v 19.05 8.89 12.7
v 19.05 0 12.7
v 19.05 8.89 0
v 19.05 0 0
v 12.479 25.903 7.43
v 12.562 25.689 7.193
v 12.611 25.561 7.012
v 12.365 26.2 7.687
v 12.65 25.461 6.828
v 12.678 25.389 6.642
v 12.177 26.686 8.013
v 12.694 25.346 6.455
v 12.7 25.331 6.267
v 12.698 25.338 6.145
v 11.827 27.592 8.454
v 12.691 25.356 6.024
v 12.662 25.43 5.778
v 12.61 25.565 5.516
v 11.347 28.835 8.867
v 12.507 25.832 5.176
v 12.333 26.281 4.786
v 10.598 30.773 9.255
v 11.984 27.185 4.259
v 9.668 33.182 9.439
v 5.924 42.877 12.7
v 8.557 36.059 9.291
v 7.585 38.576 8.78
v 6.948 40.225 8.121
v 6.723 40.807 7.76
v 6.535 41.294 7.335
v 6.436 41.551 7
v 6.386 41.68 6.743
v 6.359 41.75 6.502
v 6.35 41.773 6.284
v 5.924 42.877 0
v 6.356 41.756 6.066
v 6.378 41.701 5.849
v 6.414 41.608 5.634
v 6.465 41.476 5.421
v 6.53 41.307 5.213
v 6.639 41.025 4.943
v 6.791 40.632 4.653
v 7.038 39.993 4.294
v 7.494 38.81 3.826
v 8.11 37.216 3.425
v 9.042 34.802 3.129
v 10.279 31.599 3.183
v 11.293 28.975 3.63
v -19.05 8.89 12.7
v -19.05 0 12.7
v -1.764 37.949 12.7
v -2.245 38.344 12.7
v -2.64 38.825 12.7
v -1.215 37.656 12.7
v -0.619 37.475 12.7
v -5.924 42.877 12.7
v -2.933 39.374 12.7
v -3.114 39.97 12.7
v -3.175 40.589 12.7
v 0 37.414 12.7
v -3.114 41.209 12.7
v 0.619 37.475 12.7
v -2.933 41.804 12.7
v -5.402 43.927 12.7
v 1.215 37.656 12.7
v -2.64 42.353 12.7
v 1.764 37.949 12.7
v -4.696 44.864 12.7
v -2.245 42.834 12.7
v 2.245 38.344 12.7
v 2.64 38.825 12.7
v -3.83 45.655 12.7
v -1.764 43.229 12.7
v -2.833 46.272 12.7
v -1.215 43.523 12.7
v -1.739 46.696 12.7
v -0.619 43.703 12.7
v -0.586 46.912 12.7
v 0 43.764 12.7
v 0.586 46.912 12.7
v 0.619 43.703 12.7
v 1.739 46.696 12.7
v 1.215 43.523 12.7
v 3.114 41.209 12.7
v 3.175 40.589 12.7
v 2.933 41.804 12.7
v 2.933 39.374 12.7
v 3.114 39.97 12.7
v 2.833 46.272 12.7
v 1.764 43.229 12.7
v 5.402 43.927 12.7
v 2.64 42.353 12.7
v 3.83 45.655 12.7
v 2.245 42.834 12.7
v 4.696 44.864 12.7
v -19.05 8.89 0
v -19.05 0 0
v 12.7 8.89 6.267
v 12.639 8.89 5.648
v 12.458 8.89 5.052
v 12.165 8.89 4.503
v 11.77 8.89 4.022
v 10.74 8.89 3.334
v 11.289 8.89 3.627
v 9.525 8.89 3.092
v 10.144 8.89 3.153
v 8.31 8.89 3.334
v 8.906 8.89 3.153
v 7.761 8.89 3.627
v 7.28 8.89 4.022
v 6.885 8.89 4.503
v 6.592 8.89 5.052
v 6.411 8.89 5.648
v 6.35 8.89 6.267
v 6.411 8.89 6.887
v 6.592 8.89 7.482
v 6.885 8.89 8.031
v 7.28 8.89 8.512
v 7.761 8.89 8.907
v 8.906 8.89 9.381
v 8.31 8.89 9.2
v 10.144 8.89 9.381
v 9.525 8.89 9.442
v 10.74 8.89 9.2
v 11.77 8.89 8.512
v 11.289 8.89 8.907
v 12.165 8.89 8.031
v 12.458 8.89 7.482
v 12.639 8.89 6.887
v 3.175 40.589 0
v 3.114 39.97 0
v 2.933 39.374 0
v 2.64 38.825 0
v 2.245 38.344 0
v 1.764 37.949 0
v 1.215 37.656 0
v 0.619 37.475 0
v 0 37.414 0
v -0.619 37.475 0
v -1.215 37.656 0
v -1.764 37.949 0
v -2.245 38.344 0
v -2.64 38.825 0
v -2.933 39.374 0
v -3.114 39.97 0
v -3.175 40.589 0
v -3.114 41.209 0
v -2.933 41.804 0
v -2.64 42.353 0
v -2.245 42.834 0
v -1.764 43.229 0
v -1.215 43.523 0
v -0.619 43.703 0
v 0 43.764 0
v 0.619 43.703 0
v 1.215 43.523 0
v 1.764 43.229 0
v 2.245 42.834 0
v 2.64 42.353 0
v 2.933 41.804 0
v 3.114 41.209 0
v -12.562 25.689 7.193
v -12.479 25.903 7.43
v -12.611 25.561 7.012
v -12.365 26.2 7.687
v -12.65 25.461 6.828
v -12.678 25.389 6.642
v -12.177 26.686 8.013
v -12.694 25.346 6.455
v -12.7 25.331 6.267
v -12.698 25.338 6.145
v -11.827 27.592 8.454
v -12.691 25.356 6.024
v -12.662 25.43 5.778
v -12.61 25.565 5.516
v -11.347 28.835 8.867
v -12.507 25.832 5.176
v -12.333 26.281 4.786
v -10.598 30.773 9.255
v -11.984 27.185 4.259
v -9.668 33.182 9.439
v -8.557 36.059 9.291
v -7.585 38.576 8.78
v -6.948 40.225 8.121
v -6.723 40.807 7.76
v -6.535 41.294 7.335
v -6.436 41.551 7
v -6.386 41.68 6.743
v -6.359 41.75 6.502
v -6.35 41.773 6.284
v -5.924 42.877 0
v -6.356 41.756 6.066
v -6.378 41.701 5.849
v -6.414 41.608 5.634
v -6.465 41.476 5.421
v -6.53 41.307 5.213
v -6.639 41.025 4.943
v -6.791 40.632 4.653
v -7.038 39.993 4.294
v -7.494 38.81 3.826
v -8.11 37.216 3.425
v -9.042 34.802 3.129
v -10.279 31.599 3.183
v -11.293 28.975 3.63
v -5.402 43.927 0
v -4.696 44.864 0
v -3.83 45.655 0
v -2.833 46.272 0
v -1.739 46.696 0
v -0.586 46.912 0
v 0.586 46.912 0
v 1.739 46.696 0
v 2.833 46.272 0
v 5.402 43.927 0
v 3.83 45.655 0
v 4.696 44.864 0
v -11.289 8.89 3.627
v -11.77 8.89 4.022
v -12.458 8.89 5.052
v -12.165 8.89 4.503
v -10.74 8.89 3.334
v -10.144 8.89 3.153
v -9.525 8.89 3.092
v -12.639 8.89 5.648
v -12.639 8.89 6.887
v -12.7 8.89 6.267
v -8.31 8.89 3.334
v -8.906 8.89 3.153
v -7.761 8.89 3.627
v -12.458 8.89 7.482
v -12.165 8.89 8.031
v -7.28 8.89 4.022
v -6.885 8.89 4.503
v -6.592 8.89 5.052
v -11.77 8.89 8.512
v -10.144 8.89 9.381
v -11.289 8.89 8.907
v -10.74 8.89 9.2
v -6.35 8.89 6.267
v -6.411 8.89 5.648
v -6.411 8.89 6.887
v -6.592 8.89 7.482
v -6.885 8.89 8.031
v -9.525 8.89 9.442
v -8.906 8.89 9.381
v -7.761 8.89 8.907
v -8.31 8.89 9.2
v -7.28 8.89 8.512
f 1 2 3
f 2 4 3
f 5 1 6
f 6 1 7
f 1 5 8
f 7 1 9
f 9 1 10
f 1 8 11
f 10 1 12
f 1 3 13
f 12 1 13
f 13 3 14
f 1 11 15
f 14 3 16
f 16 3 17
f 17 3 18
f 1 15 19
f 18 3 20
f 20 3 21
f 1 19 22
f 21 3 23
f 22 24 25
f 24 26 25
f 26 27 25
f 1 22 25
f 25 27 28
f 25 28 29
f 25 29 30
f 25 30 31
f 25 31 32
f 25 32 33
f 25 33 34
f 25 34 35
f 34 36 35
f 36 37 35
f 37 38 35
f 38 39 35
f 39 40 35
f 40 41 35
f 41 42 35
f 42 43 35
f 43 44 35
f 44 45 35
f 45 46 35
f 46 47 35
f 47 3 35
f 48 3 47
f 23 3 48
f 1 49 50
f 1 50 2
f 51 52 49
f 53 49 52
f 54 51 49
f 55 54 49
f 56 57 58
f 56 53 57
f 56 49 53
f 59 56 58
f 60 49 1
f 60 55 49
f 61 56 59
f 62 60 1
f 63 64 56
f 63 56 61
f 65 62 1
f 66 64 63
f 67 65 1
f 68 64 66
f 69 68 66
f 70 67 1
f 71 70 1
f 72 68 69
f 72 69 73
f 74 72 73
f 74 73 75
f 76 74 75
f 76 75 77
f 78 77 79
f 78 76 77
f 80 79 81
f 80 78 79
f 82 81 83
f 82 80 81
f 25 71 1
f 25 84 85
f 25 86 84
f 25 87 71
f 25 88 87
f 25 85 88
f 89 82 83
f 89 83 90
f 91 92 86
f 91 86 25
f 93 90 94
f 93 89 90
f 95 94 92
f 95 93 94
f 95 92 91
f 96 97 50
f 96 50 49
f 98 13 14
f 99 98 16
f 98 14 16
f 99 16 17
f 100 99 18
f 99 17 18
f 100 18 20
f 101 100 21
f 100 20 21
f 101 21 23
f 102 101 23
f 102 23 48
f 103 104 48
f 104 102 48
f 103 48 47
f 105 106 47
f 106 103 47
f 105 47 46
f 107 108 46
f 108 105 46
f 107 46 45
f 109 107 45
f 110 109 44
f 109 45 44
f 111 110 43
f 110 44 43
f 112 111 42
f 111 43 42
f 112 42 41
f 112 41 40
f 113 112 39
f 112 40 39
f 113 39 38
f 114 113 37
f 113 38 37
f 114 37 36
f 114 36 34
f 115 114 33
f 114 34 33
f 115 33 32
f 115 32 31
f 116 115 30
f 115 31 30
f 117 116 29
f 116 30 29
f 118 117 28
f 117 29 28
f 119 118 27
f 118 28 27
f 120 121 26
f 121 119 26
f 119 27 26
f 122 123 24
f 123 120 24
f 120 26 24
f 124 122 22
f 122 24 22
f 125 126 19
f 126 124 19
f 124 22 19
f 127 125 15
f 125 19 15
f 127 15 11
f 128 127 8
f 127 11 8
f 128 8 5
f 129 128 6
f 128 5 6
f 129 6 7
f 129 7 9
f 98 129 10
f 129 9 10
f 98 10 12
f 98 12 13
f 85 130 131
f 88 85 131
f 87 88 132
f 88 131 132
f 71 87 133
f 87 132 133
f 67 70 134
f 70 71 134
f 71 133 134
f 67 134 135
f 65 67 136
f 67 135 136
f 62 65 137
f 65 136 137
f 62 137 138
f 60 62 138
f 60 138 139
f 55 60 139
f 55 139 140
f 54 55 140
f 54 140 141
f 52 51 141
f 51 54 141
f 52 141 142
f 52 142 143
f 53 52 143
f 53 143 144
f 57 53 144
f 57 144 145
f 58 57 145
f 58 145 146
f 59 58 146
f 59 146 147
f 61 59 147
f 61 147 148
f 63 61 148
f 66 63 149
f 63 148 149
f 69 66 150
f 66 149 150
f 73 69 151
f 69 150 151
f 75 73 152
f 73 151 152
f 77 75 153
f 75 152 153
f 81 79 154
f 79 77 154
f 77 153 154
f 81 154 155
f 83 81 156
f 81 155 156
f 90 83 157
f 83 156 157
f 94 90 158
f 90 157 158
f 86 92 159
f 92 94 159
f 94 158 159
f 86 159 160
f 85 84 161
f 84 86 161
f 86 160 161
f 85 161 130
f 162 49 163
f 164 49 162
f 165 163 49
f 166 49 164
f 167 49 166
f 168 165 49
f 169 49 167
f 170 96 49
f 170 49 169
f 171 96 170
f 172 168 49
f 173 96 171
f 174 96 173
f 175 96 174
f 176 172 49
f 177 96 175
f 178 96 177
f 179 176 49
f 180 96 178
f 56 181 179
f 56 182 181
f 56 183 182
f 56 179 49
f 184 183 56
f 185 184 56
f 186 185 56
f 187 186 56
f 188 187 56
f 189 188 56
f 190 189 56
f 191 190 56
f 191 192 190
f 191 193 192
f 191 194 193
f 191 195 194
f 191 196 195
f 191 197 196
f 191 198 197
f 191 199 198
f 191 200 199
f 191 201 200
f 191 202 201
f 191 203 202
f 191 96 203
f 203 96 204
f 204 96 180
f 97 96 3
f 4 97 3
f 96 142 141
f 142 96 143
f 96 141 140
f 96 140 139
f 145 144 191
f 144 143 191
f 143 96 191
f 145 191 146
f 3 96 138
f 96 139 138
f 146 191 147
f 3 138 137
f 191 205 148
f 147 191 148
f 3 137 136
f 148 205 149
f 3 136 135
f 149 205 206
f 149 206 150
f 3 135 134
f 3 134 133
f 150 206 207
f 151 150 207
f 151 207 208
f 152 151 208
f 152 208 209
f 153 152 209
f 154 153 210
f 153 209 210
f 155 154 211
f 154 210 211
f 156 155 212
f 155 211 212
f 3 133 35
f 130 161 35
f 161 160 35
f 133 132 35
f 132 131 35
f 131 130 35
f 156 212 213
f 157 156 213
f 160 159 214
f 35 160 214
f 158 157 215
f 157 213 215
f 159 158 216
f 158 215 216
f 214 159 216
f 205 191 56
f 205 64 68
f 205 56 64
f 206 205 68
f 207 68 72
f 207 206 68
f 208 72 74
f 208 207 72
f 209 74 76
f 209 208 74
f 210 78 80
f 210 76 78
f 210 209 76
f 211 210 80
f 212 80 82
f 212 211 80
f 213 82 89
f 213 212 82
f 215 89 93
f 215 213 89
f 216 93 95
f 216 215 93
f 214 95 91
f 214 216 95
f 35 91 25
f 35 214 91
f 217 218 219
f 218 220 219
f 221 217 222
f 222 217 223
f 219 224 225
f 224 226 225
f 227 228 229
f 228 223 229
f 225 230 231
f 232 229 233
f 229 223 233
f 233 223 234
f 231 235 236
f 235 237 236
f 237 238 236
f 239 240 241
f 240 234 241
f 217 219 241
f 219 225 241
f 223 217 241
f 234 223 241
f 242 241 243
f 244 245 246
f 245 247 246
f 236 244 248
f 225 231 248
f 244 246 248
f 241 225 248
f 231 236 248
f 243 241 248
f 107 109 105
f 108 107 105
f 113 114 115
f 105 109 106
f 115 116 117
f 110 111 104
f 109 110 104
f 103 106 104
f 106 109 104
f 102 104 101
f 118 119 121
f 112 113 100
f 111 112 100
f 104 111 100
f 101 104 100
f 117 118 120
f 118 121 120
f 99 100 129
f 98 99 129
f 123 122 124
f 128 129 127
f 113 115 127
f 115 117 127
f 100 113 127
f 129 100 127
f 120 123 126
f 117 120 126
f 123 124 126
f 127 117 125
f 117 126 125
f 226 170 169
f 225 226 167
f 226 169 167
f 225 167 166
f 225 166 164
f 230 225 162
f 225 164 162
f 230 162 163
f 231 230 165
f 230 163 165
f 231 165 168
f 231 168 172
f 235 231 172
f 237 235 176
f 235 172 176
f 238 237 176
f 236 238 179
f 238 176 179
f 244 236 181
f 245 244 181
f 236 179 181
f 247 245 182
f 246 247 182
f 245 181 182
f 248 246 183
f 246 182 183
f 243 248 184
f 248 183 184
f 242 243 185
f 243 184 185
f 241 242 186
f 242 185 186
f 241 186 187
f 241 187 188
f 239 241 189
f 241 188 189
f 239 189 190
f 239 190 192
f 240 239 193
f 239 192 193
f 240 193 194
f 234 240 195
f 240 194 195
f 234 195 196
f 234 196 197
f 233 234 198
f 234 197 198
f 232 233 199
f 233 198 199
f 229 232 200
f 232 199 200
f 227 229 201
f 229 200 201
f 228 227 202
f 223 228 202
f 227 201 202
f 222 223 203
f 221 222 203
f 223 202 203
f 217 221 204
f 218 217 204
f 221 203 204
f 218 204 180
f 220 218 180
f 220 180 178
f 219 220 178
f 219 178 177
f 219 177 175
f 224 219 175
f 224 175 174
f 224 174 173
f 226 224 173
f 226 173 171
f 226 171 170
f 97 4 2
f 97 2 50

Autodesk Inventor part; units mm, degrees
ref_plane "YZ Plane" through (0, 0, 0) normal (1, 0, 0) x (0, 1, 0)
ref_plane "XZ Plane" through (0, 0, 0) normal (0, 1, 0) x (-1, 0, 0)
sketch "Sketch1" plane through (0, 0, 0) normal (0, 0, 1) x (1, 0, 0)
  line L0 (0, 0) -> (0, 40.5892) construction
  circle A0 centre (0, 40.5892) radius 3.175
  line L1 (0, 0) -> (-19.05, 0)
  arc A1 (5.9236, 42.877) -> (-5.9236, 42.877) centre (0, 40.5892) ccw
  line L2 (-19.05, 0) -> (-19.05, 8.89)
  line L3 (-19.05, 8.89) -> (-5.9236, 42.877)
  line L4 (0, 0) -> (19.05, 0)
  line L5 (19.05, 0) -> (19.05, 8.89)
  line L6 (19.05, 8.89) -> (5.9236, 42.877)
  dimension "d0" = 40.5892
  dimension "d1" = 6.35
  dimension "d3" = 19.05
  dimension "d4" = 12.7
  dimension "d7" = 8.89
extrude "Extrusion1" add sketch "Sketch1" along normal blind 12.7
ref_plane "Work Plane1" through (5.9236, 42.877, 6.35) normal (0, -1, 0) x (1, 0, 0)
sketch "Sketch3" plane through (5.9236, 42.877, 6.35) normal (0, -1, 0) x (1, 0, 0)
  line L0 (3.6014, 6.1842) -> (3.6014, -6.35) construction
  circle A0 centre (3.6014, -0.0829) radius 3.175
  point P0 (-5.9236, -6.35)
  point P1 (3.6014, 6.35)
  point P2 (3.6014, 6.35)
  point P3 (3.6014, 6.35)
  dimension "d12" = 6.35
extrude "Extrusion2" cut sketch "Sketch3" along normal up to surface (33.987 mm away)
mirror "Mirror1" about plane through (0, 0, 0) normal (1, 0, 0) of "Extrusion2"
properties part number "Y_axis_motor_shaft_end_support" material "Aluminum 6061"
